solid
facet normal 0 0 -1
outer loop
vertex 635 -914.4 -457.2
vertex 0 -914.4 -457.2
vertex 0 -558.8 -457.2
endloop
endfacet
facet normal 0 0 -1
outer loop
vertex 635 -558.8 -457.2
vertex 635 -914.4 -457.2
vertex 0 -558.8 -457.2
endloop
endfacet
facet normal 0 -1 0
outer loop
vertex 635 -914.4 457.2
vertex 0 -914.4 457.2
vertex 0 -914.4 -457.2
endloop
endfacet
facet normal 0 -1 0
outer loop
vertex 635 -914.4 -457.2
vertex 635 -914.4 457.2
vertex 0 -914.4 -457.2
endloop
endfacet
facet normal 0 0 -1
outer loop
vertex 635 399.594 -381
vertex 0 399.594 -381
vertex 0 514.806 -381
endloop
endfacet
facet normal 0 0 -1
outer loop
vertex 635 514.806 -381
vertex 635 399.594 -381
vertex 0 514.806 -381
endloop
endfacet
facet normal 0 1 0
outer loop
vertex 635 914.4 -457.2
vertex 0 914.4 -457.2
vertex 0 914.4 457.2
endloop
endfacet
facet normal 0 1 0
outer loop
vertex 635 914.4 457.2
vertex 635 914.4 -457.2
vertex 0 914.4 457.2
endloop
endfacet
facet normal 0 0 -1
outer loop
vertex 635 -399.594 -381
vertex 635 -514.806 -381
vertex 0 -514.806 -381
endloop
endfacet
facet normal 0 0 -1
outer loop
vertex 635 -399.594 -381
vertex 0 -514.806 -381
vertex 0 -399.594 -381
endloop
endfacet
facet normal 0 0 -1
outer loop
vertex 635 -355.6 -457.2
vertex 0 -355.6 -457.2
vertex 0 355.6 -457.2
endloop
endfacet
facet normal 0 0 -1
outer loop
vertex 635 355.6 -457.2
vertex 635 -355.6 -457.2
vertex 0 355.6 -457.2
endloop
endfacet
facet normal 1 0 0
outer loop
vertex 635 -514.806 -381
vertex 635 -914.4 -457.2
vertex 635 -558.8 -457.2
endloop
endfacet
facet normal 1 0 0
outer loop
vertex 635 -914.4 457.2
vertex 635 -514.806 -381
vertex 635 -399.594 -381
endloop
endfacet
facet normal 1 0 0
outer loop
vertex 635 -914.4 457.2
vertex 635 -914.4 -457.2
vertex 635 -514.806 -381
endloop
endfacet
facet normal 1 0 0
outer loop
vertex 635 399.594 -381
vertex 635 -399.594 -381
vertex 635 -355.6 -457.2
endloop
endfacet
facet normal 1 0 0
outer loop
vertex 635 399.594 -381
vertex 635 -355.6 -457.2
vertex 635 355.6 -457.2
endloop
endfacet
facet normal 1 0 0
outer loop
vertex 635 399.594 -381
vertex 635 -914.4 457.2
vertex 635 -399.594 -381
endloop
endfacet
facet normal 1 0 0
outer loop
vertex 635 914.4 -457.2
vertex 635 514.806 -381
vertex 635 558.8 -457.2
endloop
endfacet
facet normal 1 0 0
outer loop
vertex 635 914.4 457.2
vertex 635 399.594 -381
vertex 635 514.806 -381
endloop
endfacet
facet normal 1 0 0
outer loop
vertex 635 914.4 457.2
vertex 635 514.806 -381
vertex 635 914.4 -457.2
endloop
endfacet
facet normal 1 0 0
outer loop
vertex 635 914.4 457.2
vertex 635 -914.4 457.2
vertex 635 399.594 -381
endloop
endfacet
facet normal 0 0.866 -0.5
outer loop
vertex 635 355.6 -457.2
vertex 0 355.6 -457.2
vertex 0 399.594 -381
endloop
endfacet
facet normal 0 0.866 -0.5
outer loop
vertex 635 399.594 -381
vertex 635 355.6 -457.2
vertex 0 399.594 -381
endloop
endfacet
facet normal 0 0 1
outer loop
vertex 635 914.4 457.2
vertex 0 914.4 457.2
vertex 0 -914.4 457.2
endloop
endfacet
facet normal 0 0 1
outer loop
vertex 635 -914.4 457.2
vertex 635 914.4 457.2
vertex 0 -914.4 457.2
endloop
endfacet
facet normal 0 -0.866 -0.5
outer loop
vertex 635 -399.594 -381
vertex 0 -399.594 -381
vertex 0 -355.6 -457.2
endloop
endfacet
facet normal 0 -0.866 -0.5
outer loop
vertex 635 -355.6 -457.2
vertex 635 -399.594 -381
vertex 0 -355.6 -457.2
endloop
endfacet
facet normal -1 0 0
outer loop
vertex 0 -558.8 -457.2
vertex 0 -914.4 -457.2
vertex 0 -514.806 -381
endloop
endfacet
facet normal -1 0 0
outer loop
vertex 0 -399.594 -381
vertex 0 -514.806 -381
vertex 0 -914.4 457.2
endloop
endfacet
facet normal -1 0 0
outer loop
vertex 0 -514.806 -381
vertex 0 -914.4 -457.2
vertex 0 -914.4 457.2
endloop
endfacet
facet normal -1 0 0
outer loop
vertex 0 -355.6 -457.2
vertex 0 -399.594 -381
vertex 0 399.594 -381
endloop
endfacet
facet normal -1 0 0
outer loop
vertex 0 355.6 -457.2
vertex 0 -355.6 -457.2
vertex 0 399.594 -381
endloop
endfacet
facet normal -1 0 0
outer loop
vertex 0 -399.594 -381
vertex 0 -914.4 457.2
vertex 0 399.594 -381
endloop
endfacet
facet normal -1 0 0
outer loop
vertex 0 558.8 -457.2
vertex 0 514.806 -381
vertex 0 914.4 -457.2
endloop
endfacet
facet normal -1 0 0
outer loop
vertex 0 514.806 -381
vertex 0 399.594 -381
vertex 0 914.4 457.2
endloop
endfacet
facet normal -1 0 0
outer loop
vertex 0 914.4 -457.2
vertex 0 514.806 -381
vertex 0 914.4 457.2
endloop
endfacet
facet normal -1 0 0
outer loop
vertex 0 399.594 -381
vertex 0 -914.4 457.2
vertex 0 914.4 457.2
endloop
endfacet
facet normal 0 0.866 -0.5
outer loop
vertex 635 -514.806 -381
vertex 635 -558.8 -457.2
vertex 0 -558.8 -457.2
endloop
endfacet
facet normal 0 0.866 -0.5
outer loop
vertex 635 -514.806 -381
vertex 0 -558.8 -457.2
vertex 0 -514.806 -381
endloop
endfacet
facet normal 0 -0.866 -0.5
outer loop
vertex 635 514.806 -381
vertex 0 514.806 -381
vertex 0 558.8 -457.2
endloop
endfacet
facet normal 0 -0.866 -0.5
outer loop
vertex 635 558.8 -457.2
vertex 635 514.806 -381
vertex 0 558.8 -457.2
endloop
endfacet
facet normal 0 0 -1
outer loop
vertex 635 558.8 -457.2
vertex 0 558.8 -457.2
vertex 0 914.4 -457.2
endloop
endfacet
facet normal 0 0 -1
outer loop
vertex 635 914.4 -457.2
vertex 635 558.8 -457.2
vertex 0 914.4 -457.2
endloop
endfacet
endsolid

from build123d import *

# Parameters (mm, degrees)
F1_DEPTH = 609.6
F2_T     = -76.2
F3_DEPTH = 635


with BuildPart() as f1:
    # F0 (on Right) → F1 (new body)
    with BuildSketch(Plane.YZ):
        Polygon((914.4, -457.2), (914.4, 457.2), (-914.4, 457.2), (-914.4, -457.2), (-558.8, -457.2), (-514.805909, -381), (-399.594091, -381), (-355.6, -457.2), (355.6, -457.2), (399.594091, -381), (514.805909, -381), (558.8, -457.2), align=None)
    extrude(amount=F1_DEPTH)

    # F2
    f2_openings = [f1.faces().sort_by_distance(p)[0] for p in [
        (304.8, 0, 457.2),
    ]]
    offset(amount=F2_T, openings=f2_openings)

    # F0 (on Right) → F3 (join)
    with BuildSketch(Plane.YZ):
        Polygon((914.4, -457.2), (914.4, 457.2), (-914.4, 457.2), (-914.4, -457.2), (-558.8, -457.2), (-514.805909, -381), (-399.594091, -381), (-355.6, -457.2), (355.6, -457.2), (399.594091, -381), (514.805909, -381), (558.8, -457.2), align=None)
    extrude(amount=F3_DEPTH)


solid = f1.part
